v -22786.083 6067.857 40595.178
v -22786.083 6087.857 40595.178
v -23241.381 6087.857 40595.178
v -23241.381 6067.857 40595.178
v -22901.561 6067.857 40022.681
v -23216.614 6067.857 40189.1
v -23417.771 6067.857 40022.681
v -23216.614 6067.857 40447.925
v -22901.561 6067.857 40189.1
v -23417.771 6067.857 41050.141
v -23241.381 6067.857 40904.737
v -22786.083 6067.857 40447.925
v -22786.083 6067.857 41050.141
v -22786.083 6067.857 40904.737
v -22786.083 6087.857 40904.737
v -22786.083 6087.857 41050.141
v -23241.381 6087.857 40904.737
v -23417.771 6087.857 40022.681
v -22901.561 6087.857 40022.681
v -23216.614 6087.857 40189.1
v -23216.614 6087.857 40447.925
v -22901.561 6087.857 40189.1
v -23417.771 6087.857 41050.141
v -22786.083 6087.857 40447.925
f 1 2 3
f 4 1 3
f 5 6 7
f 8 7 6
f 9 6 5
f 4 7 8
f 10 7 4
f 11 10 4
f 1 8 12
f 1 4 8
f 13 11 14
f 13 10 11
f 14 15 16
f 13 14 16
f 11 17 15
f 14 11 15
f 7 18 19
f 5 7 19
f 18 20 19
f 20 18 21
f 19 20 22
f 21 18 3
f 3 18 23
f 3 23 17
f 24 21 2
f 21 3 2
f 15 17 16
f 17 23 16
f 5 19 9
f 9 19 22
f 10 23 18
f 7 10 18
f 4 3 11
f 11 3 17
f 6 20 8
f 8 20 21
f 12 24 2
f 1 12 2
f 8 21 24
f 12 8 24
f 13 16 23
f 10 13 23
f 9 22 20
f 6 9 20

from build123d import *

# Parameters (mm, degrees)
BOSS_EXTRUDE1_START = 500
BOSS_EXTRUDE1_DEPTH = 20


with BuildPart() as part:
    # Sketch2 → Boss-Extrude1 (new body)
    with BuildSketch(Plane.XZ.offset(-6587.857128547).offset(BOSS_EXTRUDE1_START)):
        Polygon((-23417.771071287, 41050.141416955), (-23417.771071287, 40189.100196056), (-23417.771071287, 40022.680514279), (-22901.561141737, 40022.680514279), (-22901.561141737, 40189.100196056), (-23216.614310756, 40189.100196056), (-23216.614310756, 40447.924756229), (-22786.083114137, 40447.924756229), (-22786.083114137, 40595.178045331), (-23241.381102723, 40595.178045331), (-23241.381102723, 40904.737128326), (-22786.083114137, 40904.737128326), (-22786.083114137, 41050.141416955), align=None)
    extrude(amount=BOSS_EXTRUDE1_DEPTH)


solid = part.part
